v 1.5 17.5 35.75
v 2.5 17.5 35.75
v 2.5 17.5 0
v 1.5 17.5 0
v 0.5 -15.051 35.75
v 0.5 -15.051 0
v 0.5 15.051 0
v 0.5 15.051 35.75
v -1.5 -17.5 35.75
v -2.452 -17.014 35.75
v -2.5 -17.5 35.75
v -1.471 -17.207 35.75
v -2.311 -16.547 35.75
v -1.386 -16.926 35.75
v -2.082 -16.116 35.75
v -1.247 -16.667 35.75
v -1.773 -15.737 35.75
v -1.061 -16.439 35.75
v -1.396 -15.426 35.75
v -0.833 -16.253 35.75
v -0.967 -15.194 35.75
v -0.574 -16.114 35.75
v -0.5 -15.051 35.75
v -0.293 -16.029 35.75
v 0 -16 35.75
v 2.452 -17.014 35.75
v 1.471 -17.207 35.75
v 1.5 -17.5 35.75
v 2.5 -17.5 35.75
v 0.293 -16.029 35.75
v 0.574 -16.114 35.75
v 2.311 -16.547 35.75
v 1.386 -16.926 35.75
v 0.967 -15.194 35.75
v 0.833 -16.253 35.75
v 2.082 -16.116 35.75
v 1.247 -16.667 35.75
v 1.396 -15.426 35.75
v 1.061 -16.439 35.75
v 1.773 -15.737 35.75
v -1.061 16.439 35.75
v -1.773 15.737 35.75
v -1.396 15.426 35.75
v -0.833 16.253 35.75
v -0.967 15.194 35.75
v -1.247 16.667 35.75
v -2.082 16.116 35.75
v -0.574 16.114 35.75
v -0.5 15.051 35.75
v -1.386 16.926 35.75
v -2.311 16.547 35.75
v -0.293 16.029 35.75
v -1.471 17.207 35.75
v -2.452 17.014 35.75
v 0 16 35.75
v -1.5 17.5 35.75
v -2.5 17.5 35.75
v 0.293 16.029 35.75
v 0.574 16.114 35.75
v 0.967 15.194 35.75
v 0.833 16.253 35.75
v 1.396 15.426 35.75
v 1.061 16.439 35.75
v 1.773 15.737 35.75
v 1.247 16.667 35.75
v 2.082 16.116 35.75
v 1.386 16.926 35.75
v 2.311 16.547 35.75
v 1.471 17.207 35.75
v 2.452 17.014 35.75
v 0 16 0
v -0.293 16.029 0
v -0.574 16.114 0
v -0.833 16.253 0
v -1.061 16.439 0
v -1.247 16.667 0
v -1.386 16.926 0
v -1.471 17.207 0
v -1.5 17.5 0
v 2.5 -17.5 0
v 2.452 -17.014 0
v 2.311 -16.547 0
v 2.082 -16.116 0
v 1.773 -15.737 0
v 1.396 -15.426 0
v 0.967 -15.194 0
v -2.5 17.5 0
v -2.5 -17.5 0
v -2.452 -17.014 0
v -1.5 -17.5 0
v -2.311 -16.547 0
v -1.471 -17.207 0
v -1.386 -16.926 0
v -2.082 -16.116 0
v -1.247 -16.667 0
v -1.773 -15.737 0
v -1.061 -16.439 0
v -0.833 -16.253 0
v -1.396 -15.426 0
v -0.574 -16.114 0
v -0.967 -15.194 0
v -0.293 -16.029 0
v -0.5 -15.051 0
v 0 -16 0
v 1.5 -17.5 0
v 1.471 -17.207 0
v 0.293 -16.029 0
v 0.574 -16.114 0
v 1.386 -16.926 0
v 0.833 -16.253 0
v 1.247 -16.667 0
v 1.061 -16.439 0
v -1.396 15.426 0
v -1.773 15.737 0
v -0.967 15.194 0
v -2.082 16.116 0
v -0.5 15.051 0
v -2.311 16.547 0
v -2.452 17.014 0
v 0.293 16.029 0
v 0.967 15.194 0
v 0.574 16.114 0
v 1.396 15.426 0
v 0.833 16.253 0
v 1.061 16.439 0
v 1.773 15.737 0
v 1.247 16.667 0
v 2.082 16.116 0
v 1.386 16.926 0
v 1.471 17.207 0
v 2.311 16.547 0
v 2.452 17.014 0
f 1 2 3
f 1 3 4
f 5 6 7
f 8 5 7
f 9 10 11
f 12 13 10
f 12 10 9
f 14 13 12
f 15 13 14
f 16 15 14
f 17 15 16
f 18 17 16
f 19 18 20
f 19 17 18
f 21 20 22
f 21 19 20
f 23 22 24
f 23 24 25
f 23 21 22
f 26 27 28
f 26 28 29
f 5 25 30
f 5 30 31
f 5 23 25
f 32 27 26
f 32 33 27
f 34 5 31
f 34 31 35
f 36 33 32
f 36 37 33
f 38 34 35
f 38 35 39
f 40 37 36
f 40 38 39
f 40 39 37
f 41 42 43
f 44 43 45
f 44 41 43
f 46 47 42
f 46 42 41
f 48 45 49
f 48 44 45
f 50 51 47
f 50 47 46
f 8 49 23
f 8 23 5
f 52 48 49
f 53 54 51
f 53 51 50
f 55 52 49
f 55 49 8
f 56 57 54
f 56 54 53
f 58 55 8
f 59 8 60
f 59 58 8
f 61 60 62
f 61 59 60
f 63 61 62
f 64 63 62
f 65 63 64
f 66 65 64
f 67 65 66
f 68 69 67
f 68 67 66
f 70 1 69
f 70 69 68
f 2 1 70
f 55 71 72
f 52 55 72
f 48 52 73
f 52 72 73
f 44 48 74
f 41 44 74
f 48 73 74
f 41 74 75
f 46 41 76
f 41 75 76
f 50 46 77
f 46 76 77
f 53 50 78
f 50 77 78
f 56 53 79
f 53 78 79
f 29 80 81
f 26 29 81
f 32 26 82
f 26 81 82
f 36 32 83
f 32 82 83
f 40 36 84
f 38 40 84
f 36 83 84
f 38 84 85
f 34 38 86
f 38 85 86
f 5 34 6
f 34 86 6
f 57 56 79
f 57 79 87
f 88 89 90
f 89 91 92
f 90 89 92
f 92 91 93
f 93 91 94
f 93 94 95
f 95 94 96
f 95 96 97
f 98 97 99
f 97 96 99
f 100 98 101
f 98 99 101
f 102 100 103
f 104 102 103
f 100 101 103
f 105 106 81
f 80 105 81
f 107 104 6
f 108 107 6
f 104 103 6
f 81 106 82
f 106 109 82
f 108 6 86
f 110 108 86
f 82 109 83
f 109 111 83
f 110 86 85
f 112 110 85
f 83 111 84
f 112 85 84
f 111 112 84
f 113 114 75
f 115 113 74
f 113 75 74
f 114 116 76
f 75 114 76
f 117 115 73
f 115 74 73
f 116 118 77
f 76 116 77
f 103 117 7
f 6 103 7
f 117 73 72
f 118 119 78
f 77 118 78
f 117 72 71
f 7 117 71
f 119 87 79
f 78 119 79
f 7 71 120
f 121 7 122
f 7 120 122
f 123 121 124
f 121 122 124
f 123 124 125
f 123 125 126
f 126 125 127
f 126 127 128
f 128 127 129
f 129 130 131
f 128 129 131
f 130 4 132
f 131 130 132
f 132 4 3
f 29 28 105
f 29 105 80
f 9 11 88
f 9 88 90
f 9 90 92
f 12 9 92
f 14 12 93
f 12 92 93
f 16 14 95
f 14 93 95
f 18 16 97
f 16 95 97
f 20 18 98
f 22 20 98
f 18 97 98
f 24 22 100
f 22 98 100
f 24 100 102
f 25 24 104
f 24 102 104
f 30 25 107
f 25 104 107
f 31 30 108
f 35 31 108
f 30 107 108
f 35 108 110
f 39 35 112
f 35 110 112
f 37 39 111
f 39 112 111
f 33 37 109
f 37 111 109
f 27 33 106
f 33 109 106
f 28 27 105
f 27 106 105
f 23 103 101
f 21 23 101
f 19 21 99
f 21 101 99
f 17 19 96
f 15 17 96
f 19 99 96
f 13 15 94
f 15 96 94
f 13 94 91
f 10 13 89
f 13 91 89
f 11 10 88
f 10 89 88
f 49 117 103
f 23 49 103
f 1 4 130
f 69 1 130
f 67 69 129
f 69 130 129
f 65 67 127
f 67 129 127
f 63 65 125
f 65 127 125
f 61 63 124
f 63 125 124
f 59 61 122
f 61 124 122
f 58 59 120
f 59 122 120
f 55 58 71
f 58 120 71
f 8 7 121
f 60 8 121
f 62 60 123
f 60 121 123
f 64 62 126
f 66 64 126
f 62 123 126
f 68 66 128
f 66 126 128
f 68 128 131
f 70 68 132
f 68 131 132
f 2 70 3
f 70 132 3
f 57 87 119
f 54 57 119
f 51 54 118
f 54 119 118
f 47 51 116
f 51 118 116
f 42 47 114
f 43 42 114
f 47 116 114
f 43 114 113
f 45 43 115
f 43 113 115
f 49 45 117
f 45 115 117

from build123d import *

# Parameters (mm, degrees)
F1_DEPTH = 35.75


# Not quite as in the source:
# - a feature names something its author has since deleted; it is built from what else it names


with BuildPart() as f1:
    # F0 (on Top) → F1 (new body)
    with BuildSketch(Plane.XY):
        with BuildLine():
            ThreePointArc((-0.5, 15.0505102572), (-0.251272405, 15.0126596175), (0, 15))
            Line((0, 15), (0, 16))
            ThreePointArc((0, 16), (-1.0606601718, 16.4393398282), (-1.5, 17.5))
            Line((-1.5, 17.5), (-2.5, 17.5))
            ThreePointArc((-2.5, 17.5), (-1.9364916731, 15.9188611699), (-0.5, 15.0505102572))
        make_face()
        with BuildLine():
            Line((0, 16), (0, 15))
            ThreePointArc((0, 15), (0.251272405, 15.0126596175), (0.5, 15.0505102572))
            ThreePointArc((0.5, 15.0505102572), (1.9364916731, 15.9188611699), (2.5, 17.5))
            Line((2.5, 17.5), (1.5, 17.5))
            ThreePointArc((1.5, 17.5), (1.0606601718, 16.4393398282), (0, 16))
        make_face()
        with BuildLine():
            ThreePointArc((0.5, 15.0505102572), (0.251272405, 15.0126596175), (0, 15))
            ThreePointArc((0, 15), (-0.251272405, 15.0126596175), (-0.5, 15.0505102572))
            Line((-0.5, 15.0505102572), (-0.5, -15.0505102572))
            ThreePointArc((-0.5, -15.0505102572), (0, -15), (0.5, -15.0505102572))
            Line((0.5, -15.0505102572), (0.5, 15.0505102572))
        make_face()
        with BuildLine():
            ThreePointArc((0.5, -15.0505102572), (0, -15), (-0.5, -15.0505102572))
            ThreePointArc((-0.5, -15.0505102572), (-1.9364916731, -15.9188611699), (-2.5, -17.5))
            Line((-2.5, -17.5), (-1.5, -17.5))
            ThreePointArc((-1.5, -17.5), (0, -16), (1.5, -17.5))
            Line((1.5, -17.5), (2.5, -17.5))
            ThreePointArc((2.5, -17.5), (1.9364916731, -15.9188611699), (0.5, -15.0505102572))
        make_face()
    extrude(amount=F1_DEPTH)


solid = f1.part
